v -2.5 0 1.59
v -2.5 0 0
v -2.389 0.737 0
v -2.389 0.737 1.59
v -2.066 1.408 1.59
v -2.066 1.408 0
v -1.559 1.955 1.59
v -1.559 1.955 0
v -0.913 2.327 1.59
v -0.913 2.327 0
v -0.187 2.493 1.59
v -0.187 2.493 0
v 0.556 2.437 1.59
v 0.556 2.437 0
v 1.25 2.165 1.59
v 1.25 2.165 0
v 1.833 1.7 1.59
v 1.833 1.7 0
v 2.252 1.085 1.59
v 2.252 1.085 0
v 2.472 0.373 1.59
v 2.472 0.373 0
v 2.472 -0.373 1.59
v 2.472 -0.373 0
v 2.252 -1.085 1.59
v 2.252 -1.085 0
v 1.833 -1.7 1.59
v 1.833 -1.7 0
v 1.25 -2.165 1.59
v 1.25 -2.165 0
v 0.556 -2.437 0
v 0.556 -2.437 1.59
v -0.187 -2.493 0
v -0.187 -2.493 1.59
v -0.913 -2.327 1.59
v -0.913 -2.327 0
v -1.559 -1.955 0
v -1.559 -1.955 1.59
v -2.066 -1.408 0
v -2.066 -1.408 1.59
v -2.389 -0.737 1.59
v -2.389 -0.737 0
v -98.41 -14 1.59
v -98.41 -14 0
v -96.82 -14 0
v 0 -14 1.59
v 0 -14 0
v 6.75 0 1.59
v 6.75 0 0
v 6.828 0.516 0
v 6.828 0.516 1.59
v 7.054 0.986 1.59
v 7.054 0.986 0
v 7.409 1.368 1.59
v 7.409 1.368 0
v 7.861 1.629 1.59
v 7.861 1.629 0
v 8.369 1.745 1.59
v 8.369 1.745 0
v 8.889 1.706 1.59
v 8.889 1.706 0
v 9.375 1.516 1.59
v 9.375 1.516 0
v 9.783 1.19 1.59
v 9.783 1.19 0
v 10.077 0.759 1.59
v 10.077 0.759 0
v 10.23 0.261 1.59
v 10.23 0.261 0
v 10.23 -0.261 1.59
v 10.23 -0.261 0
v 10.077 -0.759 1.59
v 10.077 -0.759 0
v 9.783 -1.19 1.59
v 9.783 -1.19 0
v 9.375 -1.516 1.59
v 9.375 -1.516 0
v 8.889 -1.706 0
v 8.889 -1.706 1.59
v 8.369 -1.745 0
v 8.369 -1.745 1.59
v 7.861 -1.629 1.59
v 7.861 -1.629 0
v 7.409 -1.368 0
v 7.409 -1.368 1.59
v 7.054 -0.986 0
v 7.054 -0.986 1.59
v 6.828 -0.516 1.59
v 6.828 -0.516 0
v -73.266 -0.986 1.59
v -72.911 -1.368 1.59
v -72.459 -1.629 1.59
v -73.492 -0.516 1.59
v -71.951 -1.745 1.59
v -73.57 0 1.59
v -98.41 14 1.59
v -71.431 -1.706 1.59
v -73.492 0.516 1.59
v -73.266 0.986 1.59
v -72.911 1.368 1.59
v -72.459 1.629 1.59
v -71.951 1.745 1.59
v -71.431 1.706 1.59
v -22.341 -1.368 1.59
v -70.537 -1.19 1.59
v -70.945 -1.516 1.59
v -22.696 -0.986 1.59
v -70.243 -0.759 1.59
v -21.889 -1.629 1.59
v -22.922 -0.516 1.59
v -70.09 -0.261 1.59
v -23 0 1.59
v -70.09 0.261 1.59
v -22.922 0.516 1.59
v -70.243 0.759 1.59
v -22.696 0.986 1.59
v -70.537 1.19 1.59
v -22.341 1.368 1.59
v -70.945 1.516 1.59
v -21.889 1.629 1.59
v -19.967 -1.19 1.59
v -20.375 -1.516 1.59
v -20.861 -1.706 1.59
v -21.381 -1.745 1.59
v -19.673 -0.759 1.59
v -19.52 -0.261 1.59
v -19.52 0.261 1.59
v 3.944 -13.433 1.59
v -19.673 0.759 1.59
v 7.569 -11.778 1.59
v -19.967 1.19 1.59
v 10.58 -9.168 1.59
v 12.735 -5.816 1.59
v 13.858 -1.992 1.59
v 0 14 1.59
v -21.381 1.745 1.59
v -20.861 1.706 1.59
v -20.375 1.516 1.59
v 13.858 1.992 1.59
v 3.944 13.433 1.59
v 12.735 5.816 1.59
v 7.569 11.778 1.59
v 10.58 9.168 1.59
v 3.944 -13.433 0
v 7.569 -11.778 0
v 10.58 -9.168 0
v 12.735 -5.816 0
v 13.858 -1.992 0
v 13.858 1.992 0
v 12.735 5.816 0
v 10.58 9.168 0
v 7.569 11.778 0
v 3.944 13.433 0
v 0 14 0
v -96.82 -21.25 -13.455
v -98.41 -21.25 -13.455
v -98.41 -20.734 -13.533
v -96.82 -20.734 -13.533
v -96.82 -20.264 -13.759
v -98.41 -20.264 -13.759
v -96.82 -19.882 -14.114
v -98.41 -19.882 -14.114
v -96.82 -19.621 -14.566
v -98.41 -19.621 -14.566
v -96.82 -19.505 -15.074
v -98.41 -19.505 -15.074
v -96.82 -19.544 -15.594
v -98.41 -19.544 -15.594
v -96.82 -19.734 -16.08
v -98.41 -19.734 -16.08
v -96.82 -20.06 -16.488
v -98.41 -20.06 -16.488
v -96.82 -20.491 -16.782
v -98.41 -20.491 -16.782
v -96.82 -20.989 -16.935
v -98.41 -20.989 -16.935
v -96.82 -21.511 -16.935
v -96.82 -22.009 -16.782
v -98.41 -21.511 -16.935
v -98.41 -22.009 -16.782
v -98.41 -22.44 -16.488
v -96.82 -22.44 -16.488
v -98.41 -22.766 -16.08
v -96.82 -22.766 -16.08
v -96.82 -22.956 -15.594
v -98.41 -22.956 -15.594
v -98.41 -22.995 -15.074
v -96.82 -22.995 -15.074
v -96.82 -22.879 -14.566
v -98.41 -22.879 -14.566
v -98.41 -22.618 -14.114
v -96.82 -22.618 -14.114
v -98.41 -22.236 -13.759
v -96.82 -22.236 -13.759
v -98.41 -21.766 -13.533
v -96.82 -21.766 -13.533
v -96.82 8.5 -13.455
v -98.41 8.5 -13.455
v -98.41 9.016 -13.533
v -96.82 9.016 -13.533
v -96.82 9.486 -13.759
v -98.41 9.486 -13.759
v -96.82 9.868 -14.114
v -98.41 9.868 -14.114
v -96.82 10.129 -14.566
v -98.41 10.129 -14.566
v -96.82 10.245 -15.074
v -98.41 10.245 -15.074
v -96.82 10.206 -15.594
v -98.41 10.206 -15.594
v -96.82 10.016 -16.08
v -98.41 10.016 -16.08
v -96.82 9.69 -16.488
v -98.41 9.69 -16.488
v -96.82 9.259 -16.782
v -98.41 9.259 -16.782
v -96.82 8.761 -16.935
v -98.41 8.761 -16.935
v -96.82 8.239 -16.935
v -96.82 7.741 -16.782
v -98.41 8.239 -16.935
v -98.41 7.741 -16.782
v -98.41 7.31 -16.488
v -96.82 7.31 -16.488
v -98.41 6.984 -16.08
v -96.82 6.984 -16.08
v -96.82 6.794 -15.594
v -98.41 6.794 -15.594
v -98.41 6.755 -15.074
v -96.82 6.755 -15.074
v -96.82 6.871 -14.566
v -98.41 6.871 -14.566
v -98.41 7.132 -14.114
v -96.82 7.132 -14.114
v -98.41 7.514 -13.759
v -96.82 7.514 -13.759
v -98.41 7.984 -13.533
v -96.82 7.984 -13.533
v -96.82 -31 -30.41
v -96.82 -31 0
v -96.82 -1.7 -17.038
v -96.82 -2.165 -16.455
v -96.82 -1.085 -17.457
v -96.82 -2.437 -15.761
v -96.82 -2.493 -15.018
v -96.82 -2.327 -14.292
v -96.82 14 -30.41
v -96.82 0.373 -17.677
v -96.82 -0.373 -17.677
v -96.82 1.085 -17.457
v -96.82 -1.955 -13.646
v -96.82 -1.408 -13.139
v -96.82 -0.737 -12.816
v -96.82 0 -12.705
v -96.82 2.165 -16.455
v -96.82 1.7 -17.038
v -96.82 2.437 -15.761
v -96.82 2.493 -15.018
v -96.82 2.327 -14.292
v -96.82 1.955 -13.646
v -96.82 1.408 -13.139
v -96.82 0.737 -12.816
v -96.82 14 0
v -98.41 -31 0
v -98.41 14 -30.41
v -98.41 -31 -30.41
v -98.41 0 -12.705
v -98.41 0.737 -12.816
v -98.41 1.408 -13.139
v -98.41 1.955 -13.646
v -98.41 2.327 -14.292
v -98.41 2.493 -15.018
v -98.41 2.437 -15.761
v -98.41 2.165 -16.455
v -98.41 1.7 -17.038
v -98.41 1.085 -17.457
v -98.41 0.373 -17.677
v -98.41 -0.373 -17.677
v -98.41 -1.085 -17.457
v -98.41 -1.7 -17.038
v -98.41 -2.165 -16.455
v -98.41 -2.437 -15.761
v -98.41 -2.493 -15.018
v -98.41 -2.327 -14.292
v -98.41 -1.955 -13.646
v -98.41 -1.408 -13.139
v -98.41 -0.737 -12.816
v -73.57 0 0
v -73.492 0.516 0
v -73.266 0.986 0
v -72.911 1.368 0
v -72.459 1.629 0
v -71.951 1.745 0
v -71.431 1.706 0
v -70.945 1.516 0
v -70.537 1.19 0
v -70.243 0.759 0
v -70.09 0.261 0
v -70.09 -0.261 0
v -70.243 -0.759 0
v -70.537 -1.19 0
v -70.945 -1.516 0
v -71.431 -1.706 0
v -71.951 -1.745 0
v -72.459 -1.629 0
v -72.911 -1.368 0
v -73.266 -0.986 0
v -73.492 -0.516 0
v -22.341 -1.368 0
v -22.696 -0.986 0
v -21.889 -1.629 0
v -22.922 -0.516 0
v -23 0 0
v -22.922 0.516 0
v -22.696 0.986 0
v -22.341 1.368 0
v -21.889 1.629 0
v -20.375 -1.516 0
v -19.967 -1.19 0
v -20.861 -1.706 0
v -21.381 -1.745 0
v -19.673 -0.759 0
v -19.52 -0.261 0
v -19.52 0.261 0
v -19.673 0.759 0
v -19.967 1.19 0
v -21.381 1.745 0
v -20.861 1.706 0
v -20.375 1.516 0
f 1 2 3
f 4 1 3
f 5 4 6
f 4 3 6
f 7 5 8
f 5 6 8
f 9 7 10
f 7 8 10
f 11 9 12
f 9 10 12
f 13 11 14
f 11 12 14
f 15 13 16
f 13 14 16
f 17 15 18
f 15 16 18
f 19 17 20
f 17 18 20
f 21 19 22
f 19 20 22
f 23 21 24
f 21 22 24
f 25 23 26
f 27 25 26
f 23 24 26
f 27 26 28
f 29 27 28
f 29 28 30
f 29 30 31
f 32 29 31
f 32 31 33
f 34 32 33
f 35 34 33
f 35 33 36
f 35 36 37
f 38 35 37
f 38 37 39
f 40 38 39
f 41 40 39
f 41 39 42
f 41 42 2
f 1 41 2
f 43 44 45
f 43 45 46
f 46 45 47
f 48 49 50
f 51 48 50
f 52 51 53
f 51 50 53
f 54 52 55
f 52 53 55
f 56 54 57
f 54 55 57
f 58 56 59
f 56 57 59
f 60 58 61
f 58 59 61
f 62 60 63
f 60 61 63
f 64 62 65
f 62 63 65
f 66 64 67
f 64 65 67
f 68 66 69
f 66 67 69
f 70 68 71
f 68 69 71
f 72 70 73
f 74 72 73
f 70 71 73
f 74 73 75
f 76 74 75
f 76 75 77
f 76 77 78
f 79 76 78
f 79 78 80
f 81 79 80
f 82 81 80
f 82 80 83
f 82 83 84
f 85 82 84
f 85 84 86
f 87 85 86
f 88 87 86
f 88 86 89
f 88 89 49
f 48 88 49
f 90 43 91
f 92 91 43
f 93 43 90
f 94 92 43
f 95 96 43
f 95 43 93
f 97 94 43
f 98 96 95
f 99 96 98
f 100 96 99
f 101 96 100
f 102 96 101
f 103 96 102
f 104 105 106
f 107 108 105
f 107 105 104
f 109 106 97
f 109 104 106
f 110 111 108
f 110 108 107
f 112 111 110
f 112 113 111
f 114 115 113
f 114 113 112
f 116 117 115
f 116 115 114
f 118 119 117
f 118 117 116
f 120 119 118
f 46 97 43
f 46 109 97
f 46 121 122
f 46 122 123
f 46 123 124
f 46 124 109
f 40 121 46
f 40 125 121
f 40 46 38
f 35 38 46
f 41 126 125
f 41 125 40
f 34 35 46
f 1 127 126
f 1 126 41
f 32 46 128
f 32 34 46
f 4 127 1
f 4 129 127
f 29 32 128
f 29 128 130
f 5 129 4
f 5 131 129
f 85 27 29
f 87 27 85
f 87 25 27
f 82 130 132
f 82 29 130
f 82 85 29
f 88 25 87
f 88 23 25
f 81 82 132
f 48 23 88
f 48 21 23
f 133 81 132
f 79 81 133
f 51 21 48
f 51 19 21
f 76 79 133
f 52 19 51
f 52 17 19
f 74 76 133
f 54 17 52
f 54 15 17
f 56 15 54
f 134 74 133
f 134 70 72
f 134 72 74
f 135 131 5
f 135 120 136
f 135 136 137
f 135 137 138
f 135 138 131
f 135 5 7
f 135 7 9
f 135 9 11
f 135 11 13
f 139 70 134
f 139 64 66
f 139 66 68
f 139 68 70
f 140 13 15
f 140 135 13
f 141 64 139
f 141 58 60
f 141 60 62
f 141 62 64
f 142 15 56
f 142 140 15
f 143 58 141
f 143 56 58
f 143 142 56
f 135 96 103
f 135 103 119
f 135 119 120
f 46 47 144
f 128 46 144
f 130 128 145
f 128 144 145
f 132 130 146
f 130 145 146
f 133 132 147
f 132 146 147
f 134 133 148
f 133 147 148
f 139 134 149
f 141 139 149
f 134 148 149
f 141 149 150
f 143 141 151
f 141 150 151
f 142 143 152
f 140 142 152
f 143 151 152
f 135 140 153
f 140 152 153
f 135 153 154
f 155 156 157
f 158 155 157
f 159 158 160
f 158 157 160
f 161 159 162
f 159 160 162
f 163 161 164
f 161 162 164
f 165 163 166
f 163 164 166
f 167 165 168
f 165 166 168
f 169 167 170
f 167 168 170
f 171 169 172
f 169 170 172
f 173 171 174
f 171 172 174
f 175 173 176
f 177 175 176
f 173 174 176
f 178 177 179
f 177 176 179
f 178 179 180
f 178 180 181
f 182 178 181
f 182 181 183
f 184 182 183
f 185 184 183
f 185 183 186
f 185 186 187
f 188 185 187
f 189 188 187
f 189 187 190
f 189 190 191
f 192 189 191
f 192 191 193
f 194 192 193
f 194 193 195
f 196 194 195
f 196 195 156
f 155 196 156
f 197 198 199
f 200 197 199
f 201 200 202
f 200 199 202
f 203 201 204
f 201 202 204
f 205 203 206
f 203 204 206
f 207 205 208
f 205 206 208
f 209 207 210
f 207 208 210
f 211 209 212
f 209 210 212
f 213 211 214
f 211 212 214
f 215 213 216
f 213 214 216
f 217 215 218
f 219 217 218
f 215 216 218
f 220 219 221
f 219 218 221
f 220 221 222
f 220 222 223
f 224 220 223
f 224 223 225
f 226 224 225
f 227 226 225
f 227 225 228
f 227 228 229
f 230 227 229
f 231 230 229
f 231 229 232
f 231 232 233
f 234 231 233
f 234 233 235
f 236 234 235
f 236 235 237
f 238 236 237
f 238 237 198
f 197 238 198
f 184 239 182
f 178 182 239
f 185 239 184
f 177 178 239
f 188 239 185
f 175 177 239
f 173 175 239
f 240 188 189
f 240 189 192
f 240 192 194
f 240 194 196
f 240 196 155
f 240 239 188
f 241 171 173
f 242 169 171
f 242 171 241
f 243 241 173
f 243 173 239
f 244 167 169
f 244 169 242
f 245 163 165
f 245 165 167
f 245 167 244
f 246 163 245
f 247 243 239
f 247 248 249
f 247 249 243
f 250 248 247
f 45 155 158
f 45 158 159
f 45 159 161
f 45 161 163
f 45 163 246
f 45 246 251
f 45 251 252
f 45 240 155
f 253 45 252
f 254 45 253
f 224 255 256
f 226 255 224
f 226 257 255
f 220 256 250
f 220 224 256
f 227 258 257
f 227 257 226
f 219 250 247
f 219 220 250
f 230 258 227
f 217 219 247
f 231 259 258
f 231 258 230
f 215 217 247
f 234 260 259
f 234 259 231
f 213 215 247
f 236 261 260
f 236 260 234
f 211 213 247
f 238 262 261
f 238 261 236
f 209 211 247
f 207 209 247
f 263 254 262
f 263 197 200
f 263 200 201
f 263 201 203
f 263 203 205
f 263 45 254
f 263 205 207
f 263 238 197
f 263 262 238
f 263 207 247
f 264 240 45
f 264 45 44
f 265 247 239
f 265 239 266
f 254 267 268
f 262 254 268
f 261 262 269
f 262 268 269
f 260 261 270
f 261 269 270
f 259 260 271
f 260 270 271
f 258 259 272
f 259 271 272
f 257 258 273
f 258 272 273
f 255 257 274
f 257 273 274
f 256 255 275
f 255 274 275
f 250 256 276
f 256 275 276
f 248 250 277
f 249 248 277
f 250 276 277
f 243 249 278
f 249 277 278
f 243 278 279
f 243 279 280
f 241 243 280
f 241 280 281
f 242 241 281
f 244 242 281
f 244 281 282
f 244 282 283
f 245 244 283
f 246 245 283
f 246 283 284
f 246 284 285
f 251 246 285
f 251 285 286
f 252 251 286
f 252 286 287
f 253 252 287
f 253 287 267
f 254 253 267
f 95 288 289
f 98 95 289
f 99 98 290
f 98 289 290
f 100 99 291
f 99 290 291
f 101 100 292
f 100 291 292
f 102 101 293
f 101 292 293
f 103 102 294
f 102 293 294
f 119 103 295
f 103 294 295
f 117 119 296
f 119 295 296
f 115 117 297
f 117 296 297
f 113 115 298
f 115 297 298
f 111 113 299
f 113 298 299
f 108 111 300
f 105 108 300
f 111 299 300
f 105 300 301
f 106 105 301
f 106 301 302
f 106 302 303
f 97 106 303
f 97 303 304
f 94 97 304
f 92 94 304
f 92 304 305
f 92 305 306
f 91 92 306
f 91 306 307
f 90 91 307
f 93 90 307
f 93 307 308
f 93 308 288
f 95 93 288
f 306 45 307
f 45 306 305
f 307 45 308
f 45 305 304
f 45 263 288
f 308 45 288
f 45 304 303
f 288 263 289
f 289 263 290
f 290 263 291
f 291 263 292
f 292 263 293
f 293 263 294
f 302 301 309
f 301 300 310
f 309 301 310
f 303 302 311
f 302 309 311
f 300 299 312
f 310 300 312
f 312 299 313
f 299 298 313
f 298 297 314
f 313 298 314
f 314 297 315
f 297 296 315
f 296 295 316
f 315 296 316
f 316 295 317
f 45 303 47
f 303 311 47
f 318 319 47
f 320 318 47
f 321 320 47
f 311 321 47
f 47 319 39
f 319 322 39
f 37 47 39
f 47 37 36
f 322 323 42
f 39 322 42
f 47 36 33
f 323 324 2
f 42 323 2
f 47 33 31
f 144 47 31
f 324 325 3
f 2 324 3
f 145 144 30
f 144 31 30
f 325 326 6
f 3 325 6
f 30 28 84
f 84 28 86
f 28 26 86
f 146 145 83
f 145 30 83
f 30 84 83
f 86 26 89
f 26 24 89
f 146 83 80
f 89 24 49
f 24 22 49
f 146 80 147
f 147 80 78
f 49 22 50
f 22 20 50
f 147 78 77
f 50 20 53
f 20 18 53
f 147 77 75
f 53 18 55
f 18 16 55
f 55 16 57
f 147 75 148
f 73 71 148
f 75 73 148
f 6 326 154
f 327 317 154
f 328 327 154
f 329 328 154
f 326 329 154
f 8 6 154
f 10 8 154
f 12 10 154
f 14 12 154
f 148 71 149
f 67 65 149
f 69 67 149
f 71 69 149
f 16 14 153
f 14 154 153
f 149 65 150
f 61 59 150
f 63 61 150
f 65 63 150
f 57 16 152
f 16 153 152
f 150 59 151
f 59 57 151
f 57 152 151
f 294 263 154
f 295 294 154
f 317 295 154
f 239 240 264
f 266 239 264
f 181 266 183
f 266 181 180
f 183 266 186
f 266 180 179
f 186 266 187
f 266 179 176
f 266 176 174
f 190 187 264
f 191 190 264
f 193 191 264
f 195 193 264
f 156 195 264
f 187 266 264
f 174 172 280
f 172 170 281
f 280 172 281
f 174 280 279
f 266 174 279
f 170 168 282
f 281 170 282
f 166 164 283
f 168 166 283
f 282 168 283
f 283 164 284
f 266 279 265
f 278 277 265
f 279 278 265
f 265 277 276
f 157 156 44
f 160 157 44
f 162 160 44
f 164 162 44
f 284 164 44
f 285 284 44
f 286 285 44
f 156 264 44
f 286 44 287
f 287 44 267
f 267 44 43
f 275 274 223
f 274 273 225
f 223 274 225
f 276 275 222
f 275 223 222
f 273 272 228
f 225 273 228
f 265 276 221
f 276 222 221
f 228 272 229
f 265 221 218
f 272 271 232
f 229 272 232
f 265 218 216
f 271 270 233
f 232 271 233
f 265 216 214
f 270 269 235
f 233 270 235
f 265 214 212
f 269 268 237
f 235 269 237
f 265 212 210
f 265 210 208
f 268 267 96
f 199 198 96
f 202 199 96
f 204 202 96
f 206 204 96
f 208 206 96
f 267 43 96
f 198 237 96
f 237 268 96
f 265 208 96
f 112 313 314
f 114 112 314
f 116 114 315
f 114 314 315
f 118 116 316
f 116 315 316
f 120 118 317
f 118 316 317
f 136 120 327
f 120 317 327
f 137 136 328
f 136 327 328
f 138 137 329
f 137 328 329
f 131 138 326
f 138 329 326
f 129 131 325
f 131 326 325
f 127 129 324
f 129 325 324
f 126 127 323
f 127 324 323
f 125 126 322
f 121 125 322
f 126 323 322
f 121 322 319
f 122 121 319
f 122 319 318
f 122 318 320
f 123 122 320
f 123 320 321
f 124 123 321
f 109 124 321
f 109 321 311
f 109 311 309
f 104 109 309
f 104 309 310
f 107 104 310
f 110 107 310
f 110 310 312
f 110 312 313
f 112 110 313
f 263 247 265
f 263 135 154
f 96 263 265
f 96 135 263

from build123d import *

# Parameters (mm, degrees)
BOSS_EXTRUDE1_DEPTH = 1.59
SKETCH2_W           = 1.59
SKETCH2_H           = 45
BOSS_EXTRUDE2_DEPTH = 30.41
SKETCH3_R           = 1.75
SKETCH3_R_2         = 2.5
CUT_EXTRUDE1_DEPTH  = 108.565311323
SKETCH4_R           = 2.5
SKETCH4_R_2         = 1.75
CUT_EXTRUDE2_DEPTH  = 30.41


with BuildPart() as part:
    # Sketch1 → Boss-Extrude1 (new body)
    with BuildSketch(Plane.XY):
        with BuildLine():
            Line((0, 14), (-98.41, 14))
            Line((-98.41, 14), (-98.41, -14))
            Line((-98.41, -14), (0, -14))
            ThreePointArc((0, -14), (14, 0), (0, 14))
        make_face()
    extrude(amount=BOSS_EXTRUDE1_DEPTH)

    # Sketch2 → Boss-Extrude2 (add)
    with BuildSketch(Plane(origin=(0, 0, 0), x_dir=(-1, 0, 0), z_dir=(0, 0, -1))):
        with Locations((97.615, -8.5)):
            Rectangle(SKETCH2_W, SKETCH2_H)
    extrude(amount=BOSS_EXTRUDE2_DEPTH)

    # Sketch3 → Cut-Extrude1 (cut, through all)
    with BuildSketch(Plane(origin=(0, 0, 0), x_dir=(-1, 0, 0), z_dir=(0, 0, -1))):
        with Locations((71.82, 0)):
            Circle(SKETCH3_R)
        with Locations((-8.5, 0)):
            Circle(SKETCH3_R)
        Circle(SKETCH3_R_2)
        with Locations((21.25, 0)):
            Circle(SKETCH3_R)
    extrude(amount=-CUT_EXTRUDE1_DEPTH, mode=Mode.SUBTRACT)

    # Sketch4 → Cut-Extrude2 (cut)
    with BuildSketch(Plane.ZY.offset(98.41)):
        with Locations((-15.205, 0)):
            Circle(SKETCH4_R)
        with Locations((-15.205, 8.5)):
            Circle(SKETCH4_R_2)
        with Locations((-15.205, -21.25)):
            Circle(SKETCH4_R_2)
    extrude(amount=-CUT_EXTRUDE2_DEPTH, mode=Mode.SUBTRACT)


solid = part.part
